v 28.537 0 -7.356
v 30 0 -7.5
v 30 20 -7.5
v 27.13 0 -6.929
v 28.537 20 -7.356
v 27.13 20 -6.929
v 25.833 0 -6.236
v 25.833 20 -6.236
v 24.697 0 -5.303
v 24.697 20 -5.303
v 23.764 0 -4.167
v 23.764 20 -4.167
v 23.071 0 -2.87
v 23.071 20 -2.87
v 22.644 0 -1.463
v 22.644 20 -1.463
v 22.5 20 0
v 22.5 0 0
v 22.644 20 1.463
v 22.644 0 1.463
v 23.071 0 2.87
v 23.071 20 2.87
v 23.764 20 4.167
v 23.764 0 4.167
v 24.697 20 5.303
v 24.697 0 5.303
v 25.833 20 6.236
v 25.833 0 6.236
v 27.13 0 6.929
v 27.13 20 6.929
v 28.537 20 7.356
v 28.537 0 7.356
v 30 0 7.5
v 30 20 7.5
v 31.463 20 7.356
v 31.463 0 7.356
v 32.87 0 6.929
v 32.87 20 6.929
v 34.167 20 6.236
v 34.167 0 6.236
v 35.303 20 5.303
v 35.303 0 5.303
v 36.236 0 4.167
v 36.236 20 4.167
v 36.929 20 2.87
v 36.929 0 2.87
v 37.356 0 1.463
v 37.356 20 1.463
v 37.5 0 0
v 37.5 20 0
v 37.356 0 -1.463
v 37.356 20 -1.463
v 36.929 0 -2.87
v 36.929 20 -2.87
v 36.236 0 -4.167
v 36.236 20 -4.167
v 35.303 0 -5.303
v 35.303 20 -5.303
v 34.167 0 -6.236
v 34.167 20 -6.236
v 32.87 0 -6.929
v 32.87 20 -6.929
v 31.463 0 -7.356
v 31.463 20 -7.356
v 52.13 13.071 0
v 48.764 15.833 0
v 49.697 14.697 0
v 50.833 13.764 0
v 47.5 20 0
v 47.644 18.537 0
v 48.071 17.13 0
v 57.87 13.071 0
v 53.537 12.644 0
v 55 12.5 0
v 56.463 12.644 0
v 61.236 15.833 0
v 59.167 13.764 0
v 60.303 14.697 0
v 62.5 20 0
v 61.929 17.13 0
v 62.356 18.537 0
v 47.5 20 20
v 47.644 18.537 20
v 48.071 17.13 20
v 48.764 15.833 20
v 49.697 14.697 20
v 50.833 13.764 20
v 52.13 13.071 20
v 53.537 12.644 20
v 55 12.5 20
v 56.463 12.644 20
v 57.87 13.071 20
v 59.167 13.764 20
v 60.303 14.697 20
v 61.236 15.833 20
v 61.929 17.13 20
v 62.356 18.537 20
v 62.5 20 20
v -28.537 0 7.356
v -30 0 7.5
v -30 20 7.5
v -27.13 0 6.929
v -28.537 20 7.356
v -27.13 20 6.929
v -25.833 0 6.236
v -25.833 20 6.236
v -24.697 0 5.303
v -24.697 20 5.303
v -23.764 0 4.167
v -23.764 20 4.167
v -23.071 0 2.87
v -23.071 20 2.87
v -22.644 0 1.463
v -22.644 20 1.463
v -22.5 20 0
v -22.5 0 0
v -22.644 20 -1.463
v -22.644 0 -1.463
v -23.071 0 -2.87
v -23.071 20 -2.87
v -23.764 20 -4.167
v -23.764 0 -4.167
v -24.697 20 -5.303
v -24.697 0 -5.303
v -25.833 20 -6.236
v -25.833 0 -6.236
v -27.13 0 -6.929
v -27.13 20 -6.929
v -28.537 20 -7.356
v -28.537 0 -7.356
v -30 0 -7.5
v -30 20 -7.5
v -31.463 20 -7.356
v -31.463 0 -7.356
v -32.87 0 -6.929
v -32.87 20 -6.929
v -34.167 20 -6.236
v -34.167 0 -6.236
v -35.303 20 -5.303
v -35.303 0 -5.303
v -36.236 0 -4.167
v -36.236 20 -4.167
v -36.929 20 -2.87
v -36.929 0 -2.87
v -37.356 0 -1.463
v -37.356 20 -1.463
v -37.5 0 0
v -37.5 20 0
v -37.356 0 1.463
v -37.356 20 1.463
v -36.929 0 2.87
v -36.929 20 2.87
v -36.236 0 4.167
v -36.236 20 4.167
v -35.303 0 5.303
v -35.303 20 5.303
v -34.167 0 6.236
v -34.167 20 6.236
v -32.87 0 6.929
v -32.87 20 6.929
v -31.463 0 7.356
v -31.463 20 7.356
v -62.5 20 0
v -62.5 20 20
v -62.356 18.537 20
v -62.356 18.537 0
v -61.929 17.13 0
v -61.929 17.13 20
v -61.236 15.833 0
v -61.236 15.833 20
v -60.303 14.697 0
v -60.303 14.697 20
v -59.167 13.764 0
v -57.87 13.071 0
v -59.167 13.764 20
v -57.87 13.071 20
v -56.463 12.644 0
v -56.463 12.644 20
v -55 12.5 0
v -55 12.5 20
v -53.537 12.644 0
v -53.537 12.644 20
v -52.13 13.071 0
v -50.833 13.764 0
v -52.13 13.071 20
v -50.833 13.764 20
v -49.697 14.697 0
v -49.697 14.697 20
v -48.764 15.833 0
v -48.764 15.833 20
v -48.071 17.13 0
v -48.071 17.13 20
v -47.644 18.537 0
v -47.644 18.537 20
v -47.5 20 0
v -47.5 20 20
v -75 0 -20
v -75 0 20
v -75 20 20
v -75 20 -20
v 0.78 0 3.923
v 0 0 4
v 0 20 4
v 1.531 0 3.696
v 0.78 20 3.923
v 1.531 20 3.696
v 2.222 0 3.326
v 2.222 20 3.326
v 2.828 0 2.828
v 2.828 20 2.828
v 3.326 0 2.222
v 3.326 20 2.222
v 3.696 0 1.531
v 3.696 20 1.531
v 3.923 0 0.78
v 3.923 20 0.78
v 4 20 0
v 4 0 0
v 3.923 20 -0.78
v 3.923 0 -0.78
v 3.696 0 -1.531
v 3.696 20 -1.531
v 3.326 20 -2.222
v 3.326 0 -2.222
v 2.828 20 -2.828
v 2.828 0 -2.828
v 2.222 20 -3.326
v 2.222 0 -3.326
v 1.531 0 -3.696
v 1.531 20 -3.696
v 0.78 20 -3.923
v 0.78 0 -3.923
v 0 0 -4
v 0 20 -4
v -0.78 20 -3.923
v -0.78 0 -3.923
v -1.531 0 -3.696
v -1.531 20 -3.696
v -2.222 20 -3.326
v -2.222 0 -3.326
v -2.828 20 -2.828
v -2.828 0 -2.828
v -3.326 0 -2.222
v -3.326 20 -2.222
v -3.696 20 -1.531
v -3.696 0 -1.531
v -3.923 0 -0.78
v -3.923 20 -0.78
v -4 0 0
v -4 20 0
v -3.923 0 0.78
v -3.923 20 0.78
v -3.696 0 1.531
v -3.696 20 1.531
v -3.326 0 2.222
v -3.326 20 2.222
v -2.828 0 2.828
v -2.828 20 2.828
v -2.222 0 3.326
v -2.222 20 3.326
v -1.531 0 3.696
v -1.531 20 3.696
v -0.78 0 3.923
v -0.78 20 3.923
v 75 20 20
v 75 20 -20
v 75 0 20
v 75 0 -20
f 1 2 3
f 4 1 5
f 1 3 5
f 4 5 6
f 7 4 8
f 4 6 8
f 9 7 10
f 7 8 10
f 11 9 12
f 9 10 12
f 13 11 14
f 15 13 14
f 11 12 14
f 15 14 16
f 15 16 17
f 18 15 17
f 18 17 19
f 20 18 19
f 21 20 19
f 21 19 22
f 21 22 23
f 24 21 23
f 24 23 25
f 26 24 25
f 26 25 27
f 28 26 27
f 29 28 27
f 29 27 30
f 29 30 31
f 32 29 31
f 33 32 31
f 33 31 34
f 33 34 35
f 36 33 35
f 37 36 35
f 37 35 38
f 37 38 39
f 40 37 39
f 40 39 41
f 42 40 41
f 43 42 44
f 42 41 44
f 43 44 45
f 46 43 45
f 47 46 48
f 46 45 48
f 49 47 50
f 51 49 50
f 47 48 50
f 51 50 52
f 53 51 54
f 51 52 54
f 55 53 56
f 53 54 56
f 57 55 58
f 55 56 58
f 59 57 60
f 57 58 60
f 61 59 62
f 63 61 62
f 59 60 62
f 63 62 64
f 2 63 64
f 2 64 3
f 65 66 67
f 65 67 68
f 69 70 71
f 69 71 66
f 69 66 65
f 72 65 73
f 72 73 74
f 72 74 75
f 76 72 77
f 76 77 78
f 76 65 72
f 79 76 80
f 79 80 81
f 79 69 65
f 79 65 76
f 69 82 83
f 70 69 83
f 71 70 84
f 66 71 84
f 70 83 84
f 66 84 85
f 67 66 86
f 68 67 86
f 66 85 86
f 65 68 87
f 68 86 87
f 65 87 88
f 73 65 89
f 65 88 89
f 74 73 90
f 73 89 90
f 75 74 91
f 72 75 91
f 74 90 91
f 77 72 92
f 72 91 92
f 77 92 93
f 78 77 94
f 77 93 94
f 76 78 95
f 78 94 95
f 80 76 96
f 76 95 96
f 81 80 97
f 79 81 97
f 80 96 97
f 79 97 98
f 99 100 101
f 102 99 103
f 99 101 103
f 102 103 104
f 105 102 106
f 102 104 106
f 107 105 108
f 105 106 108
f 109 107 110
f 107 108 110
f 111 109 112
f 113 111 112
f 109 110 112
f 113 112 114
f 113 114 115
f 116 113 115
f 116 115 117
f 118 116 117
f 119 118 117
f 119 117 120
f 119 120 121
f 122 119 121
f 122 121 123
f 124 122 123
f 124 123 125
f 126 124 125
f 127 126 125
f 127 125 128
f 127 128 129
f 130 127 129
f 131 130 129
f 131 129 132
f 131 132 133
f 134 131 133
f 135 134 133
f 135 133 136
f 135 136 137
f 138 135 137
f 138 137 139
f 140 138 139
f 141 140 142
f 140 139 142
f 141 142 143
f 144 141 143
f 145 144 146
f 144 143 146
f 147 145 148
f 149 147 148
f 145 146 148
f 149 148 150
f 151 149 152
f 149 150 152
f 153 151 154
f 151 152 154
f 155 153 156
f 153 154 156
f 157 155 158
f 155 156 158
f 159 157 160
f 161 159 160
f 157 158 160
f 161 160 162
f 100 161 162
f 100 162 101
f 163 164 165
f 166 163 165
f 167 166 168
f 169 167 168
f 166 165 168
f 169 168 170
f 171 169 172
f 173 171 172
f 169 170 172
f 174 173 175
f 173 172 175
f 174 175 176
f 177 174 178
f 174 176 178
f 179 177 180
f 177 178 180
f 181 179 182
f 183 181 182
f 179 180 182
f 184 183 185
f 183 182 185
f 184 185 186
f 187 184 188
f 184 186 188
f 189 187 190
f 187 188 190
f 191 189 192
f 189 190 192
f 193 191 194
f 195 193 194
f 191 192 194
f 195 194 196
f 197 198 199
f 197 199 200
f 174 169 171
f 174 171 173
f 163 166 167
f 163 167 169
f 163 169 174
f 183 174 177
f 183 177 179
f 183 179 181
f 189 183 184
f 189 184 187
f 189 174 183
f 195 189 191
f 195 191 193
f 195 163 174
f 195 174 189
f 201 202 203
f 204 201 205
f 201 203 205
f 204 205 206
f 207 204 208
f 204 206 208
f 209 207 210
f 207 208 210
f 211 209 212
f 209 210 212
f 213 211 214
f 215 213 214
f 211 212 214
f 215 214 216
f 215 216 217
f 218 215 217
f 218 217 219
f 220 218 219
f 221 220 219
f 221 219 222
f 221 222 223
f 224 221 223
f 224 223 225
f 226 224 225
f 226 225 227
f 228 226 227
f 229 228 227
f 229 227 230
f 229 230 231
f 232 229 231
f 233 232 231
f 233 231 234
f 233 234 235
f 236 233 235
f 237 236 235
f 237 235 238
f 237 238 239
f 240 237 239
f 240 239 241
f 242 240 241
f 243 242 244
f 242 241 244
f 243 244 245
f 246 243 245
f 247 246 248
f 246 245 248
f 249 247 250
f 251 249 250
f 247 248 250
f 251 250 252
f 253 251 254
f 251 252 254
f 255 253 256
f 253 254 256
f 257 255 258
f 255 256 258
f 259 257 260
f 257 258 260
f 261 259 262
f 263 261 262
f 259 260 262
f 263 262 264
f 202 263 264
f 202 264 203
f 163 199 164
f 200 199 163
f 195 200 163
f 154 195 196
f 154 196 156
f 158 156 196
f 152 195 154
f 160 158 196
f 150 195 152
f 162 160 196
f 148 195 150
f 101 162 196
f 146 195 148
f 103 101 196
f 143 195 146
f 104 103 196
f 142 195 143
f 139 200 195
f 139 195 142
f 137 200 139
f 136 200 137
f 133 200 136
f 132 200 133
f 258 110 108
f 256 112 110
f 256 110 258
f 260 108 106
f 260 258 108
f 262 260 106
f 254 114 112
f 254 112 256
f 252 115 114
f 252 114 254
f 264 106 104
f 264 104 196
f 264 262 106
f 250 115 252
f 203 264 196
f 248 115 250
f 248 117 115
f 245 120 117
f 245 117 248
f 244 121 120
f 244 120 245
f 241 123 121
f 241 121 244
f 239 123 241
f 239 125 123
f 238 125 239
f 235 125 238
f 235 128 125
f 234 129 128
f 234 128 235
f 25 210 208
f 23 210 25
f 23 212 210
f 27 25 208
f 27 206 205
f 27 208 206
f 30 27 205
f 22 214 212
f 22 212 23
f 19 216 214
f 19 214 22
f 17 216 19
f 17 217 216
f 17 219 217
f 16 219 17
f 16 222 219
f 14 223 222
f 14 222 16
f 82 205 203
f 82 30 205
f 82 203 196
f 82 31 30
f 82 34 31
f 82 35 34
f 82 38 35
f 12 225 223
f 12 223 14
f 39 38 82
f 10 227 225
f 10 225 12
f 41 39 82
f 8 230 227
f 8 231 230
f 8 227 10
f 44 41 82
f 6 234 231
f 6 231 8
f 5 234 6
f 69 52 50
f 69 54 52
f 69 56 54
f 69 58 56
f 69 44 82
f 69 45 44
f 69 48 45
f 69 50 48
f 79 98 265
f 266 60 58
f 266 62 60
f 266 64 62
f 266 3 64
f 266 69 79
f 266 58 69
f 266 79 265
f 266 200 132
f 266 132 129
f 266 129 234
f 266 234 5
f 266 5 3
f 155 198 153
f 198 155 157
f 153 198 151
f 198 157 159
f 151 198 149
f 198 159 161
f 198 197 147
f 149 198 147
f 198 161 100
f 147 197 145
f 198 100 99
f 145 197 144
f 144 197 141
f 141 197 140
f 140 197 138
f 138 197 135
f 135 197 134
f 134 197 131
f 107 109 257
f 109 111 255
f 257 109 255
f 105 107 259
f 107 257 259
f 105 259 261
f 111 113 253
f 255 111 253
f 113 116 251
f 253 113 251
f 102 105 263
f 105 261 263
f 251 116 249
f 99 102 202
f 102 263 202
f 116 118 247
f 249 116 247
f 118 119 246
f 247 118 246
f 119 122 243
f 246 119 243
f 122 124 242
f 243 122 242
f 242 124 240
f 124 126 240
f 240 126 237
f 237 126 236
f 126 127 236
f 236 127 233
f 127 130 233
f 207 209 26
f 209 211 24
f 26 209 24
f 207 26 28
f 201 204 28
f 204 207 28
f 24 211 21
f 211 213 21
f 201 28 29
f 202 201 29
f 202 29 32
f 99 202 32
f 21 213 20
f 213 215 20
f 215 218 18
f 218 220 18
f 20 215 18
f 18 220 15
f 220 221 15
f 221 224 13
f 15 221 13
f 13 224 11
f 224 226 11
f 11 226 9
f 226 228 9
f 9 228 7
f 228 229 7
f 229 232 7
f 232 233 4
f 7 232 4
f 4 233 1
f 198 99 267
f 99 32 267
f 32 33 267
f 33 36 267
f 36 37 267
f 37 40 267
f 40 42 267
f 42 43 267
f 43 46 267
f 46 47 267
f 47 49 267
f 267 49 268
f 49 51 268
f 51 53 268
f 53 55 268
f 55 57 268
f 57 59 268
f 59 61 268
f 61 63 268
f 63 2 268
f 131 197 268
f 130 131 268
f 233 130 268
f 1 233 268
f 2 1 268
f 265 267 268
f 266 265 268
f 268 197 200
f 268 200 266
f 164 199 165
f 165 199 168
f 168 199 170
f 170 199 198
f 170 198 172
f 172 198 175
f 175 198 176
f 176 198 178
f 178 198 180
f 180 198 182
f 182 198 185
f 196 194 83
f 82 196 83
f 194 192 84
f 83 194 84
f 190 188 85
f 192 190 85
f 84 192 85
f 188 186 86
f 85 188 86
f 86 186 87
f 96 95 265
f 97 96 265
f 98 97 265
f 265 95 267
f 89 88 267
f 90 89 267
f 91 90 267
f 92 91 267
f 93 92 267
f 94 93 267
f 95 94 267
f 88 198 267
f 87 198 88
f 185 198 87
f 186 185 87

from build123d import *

# Parameters (mm, degrees)
CROQUIS1_W     = 150
CROQUIS1_H     = 40
EXTRUIR1_DEPTH = 20
CROQUIS4_R     = 7.5
CROQUIS4_R_2   = 4
EXTRUIR3_DEPTH = 81.156097709
CROQUIS5_R     = 7.5
EXTRUIR4_DEPTH = 20


with BuildPart() as part:
    # Croquis1 → Extruir1 (new body)
    with BuildSketch(Plane(origin=(0, 0, 0), x_dir=(1, 0, 0), z_dir=(0, 1, 0))):
        Rectangle(CROQUIS1_W, CROQUIS1_H)
    extrude(amount=EXTRUIR1_DEPTH)

    # Croquis4 → Extruir3 (cut, through all)
    with BuildSketch(Plane(origin=(0, 20, 0), x_dir=(1, 0, 0), z_dir=(0, 1, 0))):
        with Locations(Location((-30, 0, 0), (0, 0, 270))):
            Circle(CROQUIS4_R)
        with Locations(Location((30, 0, 0), (0, 0, 90))):
            Circle(CROQUIS4_R)
        with Locations(Location((0, 0, 0), (0, 0, 270))):
            Circle(CROQUIS4_R_2)
    extrude(amount=-EXTRUIR3_DEPTH, mode=Mode.SUBTRACT)

    # Croquis5 → Extruir4 (cut)
    with BuildSketch(Plane.XY.offset(20)):
        with Locations((-55, 20)):
            Circle(CROQUIS5_R)
        with Locations((55, 20)):
            Circle(CROQUIS5_R)
    extrude(amount=-EXTRUIR4_DEPTH, mode=Mode.SUBTRACT)


solid = part.part
